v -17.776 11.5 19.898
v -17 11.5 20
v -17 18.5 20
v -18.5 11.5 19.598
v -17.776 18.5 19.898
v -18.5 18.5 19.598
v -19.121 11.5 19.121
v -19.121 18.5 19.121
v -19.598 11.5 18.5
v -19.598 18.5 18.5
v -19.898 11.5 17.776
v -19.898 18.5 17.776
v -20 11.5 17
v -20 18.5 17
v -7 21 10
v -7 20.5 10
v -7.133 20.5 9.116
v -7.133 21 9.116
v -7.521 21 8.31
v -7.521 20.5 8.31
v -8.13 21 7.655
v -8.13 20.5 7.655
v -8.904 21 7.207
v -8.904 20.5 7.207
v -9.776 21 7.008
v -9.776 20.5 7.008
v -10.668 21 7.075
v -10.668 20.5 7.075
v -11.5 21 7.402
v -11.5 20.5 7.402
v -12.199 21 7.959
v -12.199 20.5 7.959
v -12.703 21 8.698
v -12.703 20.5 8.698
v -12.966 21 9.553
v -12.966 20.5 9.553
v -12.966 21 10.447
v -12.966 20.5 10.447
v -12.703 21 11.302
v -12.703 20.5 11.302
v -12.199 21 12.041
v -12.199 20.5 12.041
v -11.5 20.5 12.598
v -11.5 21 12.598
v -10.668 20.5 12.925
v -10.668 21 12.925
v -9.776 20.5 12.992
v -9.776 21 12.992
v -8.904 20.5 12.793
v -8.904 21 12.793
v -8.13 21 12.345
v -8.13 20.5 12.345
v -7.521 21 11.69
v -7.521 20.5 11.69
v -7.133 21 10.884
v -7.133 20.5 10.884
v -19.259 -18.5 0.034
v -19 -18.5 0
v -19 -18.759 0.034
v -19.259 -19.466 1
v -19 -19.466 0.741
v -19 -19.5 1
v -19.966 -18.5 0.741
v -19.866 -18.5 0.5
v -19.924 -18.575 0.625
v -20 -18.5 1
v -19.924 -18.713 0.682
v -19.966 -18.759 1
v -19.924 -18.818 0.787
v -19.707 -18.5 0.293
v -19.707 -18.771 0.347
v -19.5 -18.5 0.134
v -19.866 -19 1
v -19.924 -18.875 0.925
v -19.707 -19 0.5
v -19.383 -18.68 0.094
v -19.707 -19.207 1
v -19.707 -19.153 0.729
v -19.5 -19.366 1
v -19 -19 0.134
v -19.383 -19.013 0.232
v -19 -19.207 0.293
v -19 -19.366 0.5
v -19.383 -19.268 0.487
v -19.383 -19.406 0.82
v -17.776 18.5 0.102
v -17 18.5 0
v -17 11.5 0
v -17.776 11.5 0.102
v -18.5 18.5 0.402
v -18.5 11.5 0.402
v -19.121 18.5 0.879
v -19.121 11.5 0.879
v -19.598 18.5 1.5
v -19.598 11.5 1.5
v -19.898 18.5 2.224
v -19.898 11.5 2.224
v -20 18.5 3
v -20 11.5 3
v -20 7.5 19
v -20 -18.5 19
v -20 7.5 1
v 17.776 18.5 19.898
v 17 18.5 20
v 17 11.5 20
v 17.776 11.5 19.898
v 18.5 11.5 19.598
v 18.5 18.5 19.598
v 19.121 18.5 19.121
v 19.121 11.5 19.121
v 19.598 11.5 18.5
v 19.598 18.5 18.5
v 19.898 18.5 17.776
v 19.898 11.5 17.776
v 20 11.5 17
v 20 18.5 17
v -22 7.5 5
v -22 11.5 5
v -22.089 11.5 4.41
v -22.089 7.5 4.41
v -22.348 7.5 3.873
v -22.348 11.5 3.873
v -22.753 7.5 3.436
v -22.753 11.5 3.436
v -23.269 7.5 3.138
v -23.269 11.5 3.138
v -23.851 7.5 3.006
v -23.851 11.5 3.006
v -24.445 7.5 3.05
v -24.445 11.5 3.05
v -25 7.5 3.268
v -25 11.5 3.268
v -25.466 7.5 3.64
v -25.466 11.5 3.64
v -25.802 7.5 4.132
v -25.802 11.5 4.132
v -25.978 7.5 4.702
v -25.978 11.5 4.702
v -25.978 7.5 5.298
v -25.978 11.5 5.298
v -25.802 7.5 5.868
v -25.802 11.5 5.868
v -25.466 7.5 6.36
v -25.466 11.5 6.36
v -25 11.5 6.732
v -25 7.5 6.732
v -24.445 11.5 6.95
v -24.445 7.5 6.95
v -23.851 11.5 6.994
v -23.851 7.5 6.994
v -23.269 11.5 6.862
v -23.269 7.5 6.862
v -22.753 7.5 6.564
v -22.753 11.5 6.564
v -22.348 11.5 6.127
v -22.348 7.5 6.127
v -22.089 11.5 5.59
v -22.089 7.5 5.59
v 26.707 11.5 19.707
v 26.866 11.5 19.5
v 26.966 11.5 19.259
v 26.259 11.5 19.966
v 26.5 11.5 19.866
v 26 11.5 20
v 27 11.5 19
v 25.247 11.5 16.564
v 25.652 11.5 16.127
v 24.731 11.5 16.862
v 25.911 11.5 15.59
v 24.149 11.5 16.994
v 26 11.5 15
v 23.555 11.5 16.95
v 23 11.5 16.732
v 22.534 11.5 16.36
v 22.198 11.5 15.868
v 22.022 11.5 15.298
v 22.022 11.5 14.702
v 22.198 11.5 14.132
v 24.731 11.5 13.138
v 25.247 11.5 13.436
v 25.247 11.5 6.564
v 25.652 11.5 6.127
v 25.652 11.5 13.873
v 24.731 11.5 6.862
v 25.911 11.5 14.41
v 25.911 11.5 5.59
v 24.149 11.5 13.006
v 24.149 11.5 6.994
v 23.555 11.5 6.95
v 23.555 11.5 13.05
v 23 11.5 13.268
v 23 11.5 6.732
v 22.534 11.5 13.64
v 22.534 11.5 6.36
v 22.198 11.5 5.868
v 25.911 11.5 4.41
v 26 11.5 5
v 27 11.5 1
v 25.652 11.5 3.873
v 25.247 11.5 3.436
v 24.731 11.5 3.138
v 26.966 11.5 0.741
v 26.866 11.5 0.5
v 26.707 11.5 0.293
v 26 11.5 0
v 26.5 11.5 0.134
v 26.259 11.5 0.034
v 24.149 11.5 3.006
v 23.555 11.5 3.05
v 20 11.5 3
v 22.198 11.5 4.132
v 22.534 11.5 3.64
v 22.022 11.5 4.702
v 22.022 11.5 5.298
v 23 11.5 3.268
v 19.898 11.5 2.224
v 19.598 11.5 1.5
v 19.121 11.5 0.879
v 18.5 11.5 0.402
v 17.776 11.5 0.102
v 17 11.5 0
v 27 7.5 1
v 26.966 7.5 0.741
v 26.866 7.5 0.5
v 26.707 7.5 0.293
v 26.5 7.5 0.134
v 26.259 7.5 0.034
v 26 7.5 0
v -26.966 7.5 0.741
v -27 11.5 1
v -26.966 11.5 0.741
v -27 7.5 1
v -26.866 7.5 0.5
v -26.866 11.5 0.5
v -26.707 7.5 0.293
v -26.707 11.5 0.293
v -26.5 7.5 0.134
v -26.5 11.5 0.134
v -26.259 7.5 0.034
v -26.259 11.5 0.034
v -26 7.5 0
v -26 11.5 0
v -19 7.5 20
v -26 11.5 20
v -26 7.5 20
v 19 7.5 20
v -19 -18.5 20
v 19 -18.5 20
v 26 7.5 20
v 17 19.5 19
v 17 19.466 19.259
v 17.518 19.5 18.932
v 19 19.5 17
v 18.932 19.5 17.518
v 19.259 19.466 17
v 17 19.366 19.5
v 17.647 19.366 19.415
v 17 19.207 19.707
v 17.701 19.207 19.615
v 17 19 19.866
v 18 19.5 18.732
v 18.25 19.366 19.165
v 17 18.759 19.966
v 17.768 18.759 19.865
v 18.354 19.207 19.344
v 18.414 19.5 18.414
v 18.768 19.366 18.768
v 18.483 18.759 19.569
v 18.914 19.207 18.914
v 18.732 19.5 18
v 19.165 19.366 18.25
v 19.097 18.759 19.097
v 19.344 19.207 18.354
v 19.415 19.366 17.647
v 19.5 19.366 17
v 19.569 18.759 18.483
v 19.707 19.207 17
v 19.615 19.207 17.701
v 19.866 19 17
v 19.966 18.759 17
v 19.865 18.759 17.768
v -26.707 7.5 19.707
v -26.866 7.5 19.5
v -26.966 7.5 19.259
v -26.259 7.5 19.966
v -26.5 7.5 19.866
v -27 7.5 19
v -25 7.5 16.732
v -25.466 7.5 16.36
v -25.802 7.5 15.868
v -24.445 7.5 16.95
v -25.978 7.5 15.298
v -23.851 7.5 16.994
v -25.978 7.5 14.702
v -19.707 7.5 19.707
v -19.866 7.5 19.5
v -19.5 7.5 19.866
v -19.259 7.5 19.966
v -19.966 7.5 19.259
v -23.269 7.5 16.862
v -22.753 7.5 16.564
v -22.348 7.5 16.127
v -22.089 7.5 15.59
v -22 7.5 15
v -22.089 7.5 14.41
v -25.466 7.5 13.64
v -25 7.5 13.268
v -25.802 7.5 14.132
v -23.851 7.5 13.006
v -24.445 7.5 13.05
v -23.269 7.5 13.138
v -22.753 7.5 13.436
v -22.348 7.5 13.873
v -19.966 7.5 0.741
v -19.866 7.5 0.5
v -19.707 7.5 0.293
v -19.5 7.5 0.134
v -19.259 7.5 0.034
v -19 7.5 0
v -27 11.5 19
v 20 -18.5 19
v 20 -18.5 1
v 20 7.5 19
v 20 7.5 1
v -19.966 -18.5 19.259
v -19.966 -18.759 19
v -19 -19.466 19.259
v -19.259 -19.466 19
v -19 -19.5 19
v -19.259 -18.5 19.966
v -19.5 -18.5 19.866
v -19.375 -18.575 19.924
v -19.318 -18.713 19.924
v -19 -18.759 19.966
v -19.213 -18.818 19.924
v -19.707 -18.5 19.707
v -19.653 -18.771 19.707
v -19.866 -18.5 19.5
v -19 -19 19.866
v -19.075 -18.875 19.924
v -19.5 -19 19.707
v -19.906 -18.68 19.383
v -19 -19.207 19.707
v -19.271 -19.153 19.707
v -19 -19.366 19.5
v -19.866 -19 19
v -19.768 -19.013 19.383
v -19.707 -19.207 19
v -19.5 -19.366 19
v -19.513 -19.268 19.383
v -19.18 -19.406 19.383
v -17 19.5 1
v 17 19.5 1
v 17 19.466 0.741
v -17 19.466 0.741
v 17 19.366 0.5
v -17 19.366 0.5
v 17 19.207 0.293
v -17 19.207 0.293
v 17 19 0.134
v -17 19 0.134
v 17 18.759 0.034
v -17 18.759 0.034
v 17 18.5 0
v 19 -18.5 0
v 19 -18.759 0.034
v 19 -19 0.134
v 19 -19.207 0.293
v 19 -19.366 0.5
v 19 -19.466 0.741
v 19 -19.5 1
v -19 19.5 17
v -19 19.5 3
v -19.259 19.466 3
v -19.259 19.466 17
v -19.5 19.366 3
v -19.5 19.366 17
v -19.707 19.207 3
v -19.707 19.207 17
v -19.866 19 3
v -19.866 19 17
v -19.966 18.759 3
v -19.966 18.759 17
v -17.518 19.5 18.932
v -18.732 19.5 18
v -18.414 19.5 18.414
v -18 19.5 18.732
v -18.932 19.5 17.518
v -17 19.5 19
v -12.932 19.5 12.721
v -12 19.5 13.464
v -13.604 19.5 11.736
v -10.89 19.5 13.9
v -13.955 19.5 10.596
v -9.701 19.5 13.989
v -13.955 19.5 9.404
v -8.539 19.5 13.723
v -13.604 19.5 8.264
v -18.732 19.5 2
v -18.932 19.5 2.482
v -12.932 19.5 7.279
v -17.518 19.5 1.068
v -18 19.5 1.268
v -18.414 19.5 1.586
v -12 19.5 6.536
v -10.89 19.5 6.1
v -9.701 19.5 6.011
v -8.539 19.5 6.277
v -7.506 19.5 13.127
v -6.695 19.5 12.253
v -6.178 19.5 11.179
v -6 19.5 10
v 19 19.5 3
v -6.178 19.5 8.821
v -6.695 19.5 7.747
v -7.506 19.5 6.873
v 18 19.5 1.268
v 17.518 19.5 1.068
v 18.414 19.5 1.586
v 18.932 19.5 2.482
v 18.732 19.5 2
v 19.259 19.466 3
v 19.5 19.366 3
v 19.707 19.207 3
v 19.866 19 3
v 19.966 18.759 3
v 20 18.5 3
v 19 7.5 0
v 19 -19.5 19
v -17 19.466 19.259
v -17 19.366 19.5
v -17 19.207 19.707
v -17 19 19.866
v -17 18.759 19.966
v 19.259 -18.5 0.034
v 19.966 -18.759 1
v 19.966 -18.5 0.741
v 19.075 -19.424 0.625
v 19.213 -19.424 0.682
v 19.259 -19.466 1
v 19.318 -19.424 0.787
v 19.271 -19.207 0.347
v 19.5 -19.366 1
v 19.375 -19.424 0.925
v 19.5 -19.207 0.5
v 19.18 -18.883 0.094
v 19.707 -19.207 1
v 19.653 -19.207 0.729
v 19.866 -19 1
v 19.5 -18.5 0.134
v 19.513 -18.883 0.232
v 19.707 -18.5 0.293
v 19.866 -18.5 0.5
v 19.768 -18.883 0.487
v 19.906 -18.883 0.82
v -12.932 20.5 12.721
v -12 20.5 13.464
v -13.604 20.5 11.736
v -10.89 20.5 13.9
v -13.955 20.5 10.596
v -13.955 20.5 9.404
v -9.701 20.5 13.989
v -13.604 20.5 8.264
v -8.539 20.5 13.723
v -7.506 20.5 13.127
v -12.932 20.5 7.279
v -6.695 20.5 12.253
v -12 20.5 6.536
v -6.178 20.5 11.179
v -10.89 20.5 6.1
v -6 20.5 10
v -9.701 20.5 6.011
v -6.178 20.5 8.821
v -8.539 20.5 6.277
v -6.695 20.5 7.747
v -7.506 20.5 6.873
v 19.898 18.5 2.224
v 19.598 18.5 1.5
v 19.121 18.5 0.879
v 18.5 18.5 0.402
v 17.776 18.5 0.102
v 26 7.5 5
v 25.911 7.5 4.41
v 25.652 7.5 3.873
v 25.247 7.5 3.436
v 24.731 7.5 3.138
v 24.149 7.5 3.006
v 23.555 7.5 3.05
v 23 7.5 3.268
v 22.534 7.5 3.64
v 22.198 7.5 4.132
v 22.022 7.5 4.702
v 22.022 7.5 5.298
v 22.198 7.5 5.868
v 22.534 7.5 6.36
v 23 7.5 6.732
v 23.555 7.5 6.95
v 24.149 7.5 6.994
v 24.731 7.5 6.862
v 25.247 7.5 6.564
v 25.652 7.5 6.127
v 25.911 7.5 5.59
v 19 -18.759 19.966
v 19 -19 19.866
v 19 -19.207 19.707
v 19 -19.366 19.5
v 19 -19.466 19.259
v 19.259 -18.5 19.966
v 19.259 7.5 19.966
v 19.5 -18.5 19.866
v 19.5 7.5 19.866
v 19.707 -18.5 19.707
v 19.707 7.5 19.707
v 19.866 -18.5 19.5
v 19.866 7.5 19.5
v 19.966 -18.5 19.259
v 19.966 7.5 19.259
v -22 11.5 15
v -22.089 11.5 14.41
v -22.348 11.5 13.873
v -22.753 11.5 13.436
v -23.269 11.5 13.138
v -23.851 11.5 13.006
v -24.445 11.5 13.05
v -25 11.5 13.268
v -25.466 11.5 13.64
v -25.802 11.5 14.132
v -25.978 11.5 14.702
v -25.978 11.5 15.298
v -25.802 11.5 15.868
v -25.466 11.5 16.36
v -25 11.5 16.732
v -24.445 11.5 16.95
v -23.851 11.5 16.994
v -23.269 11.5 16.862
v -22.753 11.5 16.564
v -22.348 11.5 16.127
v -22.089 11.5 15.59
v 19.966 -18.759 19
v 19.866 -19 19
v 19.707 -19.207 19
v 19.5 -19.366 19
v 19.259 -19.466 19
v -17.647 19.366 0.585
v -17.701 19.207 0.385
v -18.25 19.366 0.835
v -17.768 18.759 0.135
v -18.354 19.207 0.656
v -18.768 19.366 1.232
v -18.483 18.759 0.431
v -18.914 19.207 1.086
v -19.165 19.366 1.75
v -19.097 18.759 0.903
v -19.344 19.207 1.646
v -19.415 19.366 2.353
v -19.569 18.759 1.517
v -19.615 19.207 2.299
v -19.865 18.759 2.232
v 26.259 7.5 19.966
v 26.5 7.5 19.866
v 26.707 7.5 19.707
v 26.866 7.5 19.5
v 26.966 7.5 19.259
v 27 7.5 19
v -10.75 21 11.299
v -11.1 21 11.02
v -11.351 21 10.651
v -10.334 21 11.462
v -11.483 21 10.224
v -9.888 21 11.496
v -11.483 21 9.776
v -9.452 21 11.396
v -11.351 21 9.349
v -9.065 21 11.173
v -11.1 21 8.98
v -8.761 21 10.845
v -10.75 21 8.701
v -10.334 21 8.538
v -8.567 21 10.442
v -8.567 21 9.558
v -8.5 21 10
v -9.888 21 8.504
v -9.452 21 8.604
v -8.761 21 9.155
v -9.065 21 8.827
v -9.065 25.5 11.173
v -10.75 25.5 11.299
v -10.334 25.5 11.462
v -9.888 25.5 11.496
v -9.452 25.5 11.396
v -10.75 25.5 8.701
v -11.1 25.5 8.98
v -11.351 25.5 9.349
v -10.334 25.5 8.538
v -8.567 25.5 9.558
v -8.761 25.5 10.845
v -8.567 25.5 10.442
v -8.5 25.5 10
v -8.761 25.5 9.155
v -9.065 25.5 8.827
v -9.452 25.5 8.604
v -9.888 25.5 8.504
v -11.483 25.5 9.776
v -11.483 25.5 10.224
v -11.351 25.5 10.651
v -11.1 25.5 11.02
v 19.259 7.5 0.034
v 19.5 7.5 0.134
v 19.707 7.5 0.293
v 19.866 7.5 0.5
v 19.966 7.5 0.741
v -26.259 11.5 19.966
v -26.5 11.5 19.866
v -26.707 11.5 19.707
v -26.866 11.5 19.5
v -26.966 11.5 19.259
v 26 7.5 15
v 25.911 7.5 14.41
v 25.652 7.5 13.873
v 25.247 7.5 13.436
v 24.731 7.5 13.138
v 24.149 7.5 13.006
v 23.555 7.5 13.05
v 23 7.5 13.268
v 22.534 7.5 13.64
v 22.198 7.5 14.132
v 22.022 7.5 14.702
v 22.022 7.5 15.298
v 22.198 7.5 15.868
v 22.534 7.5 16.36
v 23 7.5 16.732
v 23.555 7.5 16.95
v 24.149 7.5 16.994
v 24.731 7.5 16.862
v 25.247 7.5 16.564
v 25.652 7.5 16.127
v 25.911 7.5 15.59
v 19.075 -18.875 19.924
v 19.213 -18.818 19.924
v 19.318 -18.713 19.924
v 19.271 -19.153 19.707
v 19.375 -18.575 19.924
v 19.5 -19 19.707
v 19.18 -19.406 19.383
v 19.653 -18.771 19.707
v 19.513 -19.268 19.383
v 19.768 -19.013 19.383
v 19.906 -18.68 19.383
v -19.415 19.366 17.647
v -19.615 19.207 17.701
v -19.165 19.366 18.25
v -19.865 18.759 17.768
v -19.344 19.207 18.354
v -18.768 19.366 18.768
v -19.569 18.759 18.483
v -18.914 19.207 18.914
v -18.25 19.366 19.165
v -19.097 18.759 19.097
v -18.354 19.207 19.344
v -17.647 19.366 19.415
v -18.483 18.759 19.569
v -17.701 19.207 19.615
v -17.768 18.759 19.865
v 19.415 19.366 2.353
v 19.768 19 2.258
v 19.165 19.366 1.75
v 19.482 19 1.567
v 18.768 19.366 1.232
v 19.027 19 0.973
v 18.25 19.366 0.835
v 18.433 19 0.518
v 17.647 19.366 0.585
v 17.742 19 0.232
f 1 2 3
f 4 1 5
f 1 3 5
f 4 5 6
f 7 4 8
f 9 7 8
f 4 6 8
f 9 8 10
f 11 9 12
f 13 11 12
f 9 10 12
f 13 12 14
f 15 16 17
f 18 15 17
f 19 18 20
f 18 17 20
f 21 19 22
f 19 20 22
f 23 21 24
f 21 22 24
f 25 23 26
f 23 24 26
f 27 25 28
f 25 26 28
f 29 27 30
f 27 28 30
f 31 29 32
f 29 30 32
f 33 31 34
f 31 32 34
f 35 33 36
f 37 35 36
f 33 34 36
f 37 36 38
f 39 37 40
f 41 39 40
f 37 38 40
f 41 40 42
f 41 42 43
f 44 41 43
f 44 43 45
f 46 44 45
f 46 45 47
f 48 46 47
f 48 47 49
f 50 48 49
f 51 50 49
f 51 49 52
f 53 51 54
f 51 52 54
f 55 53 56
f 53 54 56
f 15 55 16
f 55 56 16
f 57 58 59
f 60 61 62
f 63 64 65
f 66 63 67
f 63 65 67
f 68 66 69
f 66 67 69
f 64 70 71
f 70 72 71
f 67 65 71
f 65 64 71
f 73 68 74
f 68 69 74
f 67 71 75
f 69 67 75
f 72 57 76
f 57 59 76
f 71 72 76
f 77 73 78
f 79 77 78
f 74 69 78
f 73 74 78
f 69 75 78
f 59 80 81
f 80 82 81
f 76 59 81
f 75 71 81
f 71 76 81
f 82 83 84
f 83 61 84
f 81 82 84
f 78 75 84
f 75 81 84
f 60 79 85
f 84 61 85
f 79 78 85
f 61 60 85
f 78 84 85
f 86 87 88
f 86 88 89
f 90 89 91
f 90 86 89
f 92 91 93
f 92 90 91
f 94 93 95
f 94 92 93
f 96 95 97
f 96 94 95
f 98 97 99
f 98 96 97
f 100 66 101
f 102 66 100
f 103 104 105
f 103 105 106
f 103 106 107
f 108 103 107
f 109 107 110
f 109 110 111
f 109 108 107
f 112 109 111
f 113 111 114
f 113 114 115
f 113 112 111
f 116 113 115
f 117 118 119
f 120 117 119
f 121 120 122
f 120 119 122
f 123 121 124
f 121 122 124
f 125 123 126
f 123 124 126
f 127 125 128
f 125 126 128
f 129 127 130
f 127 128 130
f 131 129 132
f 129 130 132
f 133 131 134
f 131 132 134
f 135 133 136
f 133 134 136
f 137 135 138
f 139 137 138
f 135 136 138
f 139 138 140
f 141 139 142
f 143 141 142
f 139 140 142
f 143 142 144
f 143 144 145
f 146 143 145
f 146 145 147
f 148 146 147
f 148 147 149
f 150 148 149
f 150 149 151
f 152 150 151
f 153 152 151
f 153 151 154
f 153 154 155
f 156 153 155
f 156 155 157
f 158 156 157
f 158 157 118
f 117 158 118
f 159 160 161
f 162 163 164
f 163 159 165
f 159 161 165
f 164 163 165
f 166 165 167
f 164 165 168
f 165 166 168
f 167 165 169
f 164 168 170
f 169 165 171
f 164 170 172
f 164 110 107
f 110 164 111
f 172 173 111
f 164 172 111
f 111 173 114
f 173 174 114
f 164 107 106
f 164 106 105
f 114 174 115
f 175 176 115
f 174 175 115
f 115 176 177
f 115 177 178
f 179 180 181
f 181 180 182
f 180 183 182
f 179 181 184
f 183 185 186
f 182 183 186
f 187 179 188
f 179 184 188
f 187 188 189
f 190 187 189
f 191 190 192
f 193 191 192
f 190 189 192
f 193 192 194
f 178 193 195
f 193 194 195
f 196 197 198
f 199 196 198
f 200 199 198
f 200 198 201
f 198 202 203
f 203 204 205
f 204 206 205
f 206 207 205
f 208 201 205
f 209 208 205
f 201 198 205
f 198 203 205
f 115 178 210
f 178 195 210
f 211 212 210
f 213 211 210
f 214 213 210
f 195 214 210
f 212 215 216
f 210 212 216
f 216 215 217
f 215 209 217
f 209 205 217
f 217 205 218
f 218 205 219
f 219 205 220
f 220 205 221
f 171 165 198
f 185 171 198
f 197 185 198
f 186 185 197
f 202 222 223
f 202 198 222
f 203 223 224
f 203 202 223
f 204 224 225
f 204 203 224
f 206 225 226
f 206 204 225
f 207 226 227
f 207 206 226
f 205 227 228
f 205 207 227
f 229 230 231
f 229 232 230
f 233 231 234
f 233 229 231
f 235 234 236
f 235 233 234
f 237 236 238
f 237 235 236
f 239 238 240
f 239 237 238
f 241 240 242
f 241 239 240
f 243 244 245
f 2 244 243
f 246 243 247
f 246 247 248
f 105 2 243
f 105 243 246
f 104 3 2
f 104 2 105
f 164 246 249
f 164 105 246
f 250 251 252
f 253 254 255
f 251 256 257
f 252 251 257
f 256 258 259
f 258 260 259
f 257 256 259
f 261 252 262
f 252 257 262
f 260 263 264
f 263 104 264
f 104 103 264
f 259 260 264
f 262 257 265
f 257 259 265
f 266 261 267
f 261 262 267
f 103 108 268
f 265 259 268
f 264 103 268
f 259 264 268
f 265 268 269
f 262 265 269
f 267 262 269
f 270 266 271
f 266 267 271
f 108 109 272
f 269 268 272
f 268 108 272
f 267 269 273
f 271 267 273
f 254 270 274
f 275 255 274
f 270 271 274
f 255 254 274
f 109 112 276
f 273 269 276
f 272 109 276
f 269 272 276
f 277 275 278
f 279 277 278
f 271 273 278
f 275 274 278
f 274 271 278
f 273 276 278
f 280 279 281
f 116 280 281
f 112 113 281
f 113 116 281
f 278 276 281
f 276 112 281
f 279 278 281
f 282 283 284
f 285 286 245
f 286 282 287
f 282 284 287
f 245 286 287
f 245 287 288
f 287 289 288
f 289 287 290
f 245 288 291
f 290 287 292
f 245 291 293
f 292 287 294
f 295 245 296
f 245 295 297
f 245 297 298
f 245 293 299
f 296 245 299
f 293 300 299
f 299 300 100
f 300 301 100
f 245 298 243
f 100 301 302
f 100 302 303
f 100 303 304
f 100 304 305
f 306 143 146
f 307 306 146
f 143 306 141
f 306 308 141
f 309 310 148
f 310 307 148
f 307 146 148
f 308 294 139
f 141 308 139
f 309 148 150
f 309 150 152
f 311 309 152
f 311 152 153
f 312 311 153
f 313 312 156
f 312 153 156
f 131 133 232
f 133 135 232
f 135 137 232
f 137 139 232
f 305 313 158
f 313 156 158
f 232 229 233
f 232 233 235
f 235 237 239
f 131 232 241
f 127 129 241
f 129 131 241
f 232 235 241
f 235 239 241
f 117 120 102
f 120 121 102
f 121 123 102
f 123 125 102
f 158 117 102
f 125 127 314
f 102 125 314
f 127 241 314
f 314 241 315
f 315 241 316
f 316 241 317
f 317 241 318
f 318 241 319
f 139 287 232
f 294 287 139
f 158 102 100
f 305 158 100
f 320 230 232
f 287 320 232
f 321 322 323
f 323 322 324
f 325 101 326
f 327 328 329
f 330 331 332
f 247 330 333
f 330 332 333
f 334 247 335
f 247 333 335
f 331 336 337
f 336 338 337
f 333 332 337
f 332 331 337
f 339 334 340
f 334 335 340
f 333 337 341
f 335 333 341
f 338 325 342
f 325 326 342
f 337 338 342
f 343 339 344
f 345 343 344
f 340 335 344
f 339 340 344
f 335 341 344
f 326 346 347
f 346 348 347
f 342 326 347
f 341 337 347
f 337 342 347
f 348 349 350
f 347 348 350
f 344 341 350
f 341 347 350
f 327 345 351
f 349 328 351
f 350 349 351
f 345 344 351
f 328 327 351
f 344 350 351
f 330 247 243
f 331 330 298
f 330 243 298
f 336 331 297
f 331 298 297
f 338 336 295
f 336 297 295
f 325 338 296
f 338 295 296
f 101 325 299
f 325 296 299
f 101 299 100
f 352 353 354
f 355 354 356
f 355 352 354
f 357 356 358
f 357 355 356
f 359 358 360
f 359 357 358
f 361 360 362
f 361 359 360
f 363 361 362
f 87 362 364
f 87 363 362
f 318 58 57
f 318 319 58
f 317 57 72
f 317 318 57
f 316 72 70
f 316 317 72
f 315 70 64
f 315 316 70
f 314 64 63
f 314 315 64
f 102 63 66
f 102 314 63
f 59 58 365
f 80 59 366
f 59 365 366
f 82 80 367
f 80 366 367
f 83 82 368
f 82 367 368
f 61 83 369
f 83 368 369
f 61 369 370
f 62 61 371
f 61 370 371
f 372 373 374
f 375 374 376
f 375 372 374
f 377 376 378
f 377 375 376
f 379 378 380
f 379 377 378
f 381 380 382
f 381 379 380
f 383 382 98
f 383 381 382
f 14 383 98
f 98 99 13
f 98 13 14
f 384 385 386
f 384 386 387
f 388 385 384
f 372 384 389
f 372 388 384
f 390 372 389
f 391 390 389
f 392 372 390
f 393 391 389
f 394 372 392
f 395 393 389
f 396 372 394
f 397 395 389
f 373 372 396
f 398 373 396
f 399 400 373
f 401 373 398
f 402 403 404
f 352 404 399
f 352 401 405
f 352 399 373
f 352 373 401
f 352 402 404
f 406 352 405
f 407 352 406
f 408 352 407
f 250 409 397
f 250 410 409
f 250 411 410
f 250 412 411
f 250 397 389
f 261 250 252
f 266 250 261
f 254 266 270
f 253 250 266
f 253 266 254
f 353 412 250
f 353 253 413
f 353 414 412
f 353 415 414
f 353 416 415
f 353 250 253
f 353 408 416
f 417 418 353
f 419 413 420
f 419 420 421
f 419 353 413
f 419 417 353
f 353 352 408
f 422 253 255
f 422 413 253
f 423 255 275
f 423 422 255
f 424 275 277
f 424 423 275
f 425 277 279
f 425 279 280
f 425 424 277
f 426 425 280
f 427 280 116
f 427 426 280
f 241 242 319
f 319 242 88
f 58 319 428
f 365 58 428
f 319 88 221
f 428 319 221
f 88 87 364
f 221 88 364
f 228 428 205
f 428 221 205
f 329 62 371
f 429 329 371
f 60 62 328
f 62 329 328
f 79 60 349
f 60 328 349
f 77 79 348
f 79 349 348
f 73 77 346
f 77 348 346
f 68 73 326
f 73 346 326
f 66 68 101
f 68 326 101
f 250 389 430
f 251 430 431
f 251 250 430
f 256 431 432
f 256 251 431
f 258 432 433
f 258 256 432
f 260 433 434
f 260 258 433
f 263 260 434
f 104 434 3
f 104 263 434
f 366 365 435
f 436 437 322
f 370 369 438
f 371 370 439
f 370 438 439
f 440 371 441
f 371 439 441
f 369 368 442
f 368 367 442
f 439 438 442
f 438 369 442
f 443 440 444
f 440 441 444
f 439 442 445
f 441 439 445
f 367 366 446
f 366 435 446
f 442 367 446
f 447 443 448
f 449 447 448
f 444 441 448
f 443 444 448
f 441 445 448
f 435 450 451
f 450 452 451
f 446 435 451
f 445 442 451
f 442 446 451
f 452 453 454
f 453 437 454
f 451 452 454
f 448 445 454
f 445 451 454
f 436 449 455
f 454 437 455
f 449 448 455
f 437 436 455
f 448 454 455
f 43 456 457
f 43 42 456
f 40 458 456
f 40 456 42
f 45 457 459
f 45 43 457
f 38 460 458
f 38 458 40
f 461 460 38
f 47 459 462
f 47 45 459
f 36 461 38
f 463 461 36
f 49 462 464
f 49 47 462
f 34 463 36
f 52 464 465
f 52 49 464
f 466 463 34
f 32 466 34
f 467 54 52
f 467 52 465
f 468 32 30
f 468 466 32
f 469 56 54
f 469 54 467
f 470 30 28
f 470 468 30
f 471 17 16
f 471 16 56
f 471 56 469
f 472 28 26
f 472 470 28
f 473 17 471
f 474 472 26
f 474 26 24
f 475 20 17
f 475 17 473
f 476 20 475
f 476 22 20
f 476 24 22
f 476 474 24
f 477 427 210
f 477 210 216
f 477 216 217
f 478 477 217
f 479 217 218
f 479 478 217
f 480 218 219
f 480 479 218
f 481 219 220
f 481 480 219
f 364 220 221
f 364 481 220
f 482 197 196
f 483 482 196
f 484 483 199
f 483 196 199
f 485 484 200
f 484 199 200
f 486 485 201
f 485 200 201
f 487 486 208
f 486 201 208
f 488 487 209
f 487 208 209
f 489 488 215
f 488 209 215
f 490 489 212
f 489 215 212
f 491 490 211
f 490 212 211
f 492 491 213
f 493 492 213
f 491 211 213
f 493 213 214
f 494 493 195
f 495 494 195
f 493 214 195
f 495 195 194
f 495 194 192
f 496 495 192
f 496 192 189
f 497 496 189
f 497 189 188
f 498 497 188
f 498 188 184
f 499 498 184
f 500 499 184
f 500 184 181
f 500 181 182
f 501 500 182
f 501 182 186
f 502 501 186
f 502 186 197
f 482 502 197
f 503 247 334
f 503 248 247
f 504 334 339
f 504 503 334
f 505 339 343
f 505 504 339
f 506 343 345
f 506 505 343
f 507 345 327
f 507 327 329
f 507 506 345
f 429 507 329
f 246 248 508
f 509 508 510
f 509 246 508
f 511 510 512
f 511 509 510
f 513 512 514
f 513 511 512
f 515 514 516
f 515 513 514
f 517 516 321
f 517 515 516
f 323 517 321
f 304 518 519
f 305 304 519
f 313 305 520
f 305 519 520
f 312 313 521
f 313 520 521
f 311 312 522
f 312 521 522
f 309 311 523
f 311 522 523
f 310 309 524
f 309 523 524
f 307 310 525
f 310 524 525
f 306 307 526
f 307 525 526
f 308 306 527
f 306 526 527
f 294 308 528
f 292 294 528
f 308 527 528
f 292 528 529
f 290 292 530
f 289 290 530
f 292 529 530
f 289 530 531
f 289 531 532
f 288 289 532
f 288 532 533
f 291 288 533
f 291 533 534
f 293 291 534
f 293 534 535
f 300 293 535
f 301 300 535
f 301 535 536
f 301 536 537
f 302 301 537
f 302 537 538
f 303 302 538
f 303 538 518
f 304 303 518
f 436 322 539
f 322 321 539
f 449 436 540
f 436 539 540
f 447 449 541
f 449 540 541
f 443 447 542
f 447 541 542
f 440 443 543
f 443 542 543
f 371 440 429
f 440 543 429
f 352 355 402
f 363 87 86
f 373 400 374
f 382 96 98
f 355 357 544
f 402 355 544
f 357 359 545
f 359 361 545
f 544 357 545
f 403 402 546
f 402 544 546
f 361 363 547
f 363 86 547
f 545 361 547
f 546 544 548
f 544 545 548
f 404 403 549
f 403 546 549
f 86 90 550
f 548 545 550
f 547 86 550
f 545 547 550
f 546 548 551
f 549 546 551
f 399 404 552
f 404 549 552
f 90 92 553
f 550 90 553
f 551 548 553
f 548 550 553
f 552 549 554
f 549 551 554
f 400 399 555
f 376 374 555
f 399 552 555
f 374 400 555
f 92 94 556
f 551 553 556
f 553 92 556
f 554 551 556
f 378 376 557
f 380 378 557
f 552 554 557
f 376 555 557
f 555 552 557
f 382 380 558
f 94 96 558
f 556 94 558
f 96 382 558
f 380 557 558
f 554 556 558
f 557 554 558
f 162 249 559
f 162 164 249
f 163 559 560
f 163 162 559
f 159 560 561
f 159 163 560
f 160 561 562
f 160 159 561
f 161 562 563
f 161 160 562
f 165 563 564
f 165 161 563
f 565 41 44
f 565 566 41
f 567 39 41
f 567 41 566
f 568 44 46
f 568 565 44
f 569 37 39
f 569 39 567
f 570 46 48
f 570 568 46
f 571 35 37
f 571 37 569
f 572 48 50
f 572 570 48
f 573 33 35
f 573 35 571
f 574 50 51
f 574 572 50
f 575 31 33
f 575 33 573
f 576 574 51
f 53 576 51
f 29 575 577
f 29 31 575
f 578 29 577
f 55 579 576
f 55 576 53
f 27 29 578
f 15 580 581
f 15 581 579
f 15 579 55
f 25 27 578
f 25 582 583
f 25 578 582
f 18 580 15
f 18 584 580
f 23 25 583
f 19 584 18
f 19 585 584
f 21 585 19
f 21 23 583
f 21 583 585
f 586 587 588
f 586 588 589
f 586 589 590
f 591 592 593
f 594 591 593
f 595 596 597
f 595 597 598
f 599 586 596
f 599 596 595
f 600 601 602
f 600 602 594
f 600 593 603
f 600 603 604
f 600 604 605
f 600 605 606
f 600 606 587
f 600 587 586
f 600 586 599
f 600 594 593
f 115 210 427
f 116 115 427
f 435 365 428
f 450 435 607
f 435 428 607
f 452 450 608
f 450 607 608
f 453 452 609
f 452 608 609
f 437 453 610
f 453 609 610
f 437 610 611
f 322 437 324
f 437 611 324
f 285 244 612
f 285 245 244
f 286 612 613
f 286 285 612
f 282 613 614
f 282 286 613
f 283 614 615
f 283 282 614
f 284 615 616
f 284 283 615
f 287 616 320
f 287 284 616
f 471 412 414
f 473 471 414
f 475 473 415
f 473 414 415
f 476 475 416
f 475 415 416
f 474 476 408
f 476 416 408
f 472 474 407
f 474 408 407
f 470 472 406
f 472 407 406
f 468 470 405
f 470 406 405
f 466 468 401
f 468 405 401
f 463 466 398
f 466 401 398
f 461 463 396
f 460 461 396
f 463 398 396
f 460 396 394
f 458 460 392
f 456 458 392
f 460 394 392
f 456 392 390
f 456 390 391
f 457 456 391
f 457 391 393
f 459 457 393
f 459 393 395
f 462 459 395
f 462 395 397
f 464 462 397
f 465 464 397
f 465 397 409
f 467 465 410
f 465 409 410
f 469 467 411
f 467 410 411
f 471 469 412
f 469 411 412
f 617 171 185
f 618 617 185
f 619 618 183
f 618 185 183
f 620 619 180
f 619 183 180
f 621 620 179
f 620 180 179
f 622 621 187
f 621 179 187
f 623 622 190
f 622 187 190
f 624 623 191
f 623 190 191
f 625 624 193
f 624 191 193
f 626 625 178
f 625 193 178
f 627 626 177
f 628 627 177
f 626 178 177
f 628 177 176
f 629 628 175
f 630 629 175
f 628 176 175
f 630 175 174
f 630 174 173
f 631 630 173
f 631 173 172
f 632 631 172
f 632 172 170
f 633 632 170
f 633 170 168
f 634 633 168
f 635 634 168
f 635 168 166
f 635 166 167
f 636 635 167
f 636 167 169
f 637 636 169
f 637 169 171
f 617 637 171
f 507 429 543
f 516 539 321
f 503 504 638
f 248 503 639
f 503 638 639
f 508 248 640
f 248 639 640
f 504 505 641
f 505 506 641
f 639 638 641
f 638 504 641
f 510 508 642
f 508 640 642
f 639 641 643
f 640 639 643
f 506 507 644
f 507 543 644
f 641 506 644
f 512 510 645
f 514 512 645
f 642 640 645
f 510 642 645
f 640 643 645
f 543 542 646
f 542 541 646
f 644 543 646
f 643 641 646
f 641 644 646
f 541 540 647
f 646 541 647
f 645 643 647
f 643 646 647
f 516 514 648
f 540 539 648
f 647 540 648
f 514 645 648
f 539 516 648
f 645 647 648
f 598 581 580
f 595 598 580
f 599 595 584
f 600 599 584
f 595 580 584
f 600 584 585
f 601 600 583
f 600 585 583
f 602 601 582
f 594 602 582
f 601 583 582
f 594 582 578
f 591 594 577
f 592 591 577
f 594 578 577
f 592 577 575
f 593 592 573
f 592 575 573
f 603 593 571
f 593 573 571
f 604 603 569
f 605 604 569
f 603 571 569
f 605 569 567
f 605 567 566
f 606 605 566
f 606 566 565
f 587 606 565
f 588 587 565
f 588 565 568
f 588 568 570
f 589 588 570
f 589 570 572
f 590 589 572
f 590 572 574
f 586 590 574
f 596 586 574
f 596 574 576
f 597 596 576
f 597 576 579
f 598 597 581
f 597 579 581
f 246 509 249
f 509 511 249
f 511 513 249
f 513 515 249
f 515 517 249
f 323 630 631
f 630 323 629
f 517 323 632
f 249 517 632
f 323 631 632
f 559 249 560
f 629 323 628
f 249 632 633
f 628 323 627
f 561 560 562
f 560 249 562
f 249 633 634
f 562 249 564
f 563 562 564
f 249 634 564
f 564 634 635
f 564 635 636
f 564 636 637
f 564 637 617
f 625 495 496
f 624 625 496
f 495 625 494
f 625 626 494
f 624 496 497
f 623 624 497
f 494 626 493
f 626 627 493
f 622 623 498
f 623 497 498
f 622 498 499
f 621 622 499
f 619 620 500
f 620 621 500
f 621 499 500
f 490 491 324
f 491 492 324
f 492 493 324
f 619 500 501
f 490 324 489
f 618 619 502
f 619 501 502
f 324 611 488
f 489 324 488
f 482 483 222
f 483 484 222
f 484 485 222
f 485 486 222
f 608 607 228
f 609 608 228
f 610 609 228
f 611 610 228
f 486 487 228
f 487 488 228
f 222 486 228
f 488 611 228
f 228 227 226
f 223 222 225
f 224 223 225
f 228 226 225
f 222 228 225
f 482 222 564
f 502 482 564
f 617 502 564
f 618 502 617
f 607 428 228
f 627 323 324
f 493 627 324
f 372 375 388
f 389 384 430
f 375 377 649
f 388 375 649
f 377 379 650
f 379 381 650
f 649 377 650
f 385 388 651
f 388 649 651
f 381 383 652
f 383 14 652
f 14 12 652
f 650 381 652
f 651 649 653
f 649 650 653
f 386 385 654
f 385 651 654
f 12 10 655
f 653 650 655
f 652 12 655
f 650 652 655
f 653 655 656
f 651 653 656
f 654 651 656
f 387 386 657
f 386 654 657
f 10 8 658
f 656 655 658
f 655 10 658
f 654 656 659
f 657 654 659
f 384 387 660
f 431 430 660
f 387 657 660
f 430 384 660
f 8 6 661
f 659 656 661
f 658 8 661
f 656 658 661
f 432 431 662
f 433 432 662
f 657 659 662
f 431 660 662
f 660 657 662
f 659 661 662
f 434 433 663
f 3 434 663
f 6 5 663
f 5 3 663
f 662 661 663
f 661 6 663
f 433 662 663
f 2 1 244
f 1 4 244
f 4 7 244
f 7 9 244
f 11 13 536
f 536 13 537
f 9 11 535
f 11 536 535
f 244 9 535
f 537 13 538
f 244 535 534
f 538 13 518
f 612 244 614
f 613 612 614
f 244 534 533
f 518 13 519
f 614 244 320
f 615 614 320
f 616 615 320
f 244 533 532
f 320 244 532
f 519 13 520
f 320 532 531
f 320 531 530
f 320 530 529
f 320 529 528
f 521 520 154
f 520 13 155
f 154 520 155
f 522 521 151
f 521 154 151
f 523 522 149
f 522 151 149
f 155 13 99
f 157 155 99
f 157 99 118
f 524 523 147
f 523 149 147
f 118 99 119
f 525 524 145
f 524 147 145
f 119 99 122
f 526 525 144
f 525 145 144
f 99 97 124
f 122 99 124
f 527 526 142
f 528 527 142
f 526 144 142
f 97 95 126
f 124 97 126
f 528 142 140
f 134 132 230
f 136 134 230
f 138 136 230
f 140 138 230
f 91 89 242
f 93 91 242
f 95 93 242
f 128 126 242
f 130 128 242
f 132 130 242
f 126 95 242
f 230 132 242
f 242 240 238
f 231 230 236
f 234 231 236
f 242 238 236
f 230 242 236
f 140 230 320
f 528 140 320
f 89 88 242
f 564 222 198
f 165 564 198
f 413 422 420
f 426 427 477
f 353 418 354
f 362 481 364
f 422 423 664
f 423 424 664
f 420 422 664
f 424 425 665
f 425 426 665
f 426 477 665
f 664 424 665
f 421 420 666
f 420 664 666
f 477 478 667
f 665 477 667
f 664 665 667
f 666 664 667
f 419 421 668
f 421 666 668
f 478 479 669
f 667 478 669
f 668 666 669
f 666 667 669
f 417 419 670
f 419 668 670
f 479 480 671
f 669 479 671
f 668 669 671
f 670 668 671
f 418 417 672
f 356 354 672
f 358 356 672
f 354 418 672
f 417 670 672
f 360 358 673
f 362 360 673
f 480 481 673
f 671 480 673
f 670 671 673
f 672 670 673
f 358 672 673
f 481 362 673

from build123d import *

# Parameters (mm, degrees)
SKETCH_1_W          = 40
SKETCH_1_H          = 39
SKETCH_1_R          = 2
EXTRUDE_2_DEPTH     = 20
SKETCH_4_R          = 2
CUT_EXTRUDE_1_DEPTH = 20
SKETCH_5_R          = 4
EXTRUDE_3_DEPTH     = 1
SKETCH_6_R          = 3
EXTRUDE_4_DEPTH     = 0.5
SKETCH_7_R          = 1.5
EXTRUDE_5_DEPTH     = 4.5
FILLET_2_R          = 3
FILLET_3_R          = 3
FILLET_4_R          = 1
FILLET_5_R          = 1
FILLET_6_R          = 1
FILLET_8_R          = 1


with BuildPart() as part:
    # 草图1 → 凸台-拉伸2 (new body)
    with BuildSketch(Plane.XY):
        Rectangle(SKETCH_1_W, SKETCH_1_H)
        with BuildLine():
            Line((-20, 7.5), (-20, 11.5))
            Line((-20, 11.5), (-24, 11.5))
            ThreePointArc((-24, 11.5), (-22.585786438, 10.914213562), (-22, 9.5))
            ThreePointArc((-22, 9.5), (-22.585786438, 8.085786438), (-24, 7.5))
            Line((-24, 7.5), (-20, 7.5))
        make_face()
        with BuildLine():
            ThreePointArc((-24, 7.5), (-26, 9.5), (-24, 11.5))
            Line((-24, 11.5), (-27, 11.5))
            Line((-27, 11.5), (-27, 7.5))
            Line((-27, 7.5), (-24, 7.5))
        make_face()
        with Locations((-24, 9.5)):
            Circle(SKETCH_1_R)
        Polygon((27, 11.5), (20, 11.5), (20, 7.5), (24, 7.5), (27, 7.5), align=None)
    extrude(amount=EXTRUDE_2_DEPTH)

    # 草图4 → 切除-拉伸1 (cut)
    with BuildSketch(Plane(origin=(0, 19.5, 0), x_dir=(1, 0, 0), z_dir=(0, 1, 0))):
        with Locations((-24, -15)):
            Circle(SKETCH_4_R)
        with Locations((24, -15)):
            Circle(SKETCH_4_R)
        with Locations((-24, -5)):
            Circle(SKETCH_4_R)
        with Locations((24, -5)):
            Circle(SKETCH_4_R)
    extrude(amount=-CUT_EXTRUDE_1_DEPTH, mode=Mode.SUBTRACT)

    # 草图5 → 凸台-拉伸3 (add)
    with BuildSketch(Plane(origin=(0, 19.5, 0), x_dir=(1, 0, 0), z_dir=(0, 1, 0))):
        with Locations((-10, -10)):
            Circle(SKETCH_5_R)
    extrude(amount=EXTRUDE_3_DEPTH)

    # 草图6 → 凸台-拉伸4 (add)
    with BuildSketch(Plane(origin=(0, 20.5, 0), x_dir=(1, 0, 0), z_dir=(0, 1, 0))):
        with Locations((-10, -10)):
            Circle(SKETCH_6_R)
    extrude(amount=EXTRUDE_4_DEPTH)

    # 草图7 → 凸台-拉伸5 (add)
    with BuildSketch(Plane(origin=(0, 21, 0), x_dir=(1, 0, 0), z_dir=(0, 1, 0))):
        with Locations((-10, -10)):
            Circle(SKETCH_7_R)
    extrude(amount=EXTRUDE_5_DEPTH)

    # 圆角2
    fillet_2_edges = [part.edges().sort_by_distance(p)[0] for p in [
        (-20, 15.5, 20),
    ]]
    fillet(fillet_2_edges, radius=FILLET_2_R)

    # 圆角3
    fillet_3_edges = [part.edges().sort_by_distance(p)[0] for p in [
        (-20, 15.5, 0),
        (20, 15.5, 0),
        (20, 15.5, 20),
    ]]
    fillet(fillet_3_edges, radius=FILLET_3_R)

    # 圆角4
    fillet_4_edges = [part.edges().sort_by_distance(p)[0] for p in [
        (20, -6, 0),
        (0, -19.5, 0),
        (-20, -6, 0),
        (20, -19.5, 10),
        (-20, -19.5, 10),
        (-20, -6, 20),
        (0, -19.5, 20),
        (20, -6, 20),
    ]]
    fillet(fillet_4_edges, radius=FILLET_4_R)

    # 圆角5
    fillet_5_edges = [part.edges().sort_by_distance(p)[0] for p in [
        (-27, 9.5, 0),
        (-27, 9.5, 20),
    ]]
    fillet(fillet_5_edges, radius=FILLET_5_R)

    # 圆角6
    fillet_6_edges = [part.edges().sort_by_distance(p)[0] for p in [
        (19.121320344, 19.5, 0.878679656),
        (19.121320344, 19.5, 19.121320344),
        (0, 19.5, 20),
        (-20, 19.5, 10),
        (-19.121320344, 19.5, 19.121320344),
        (20, 19.5, 10),
        (0, 19.5, 0),
        (-19.121320344, 19.5, 0.878679656),
    ]]
    fillet(fillet_6_edges, radius=FILLET_6_R)

    # 圆角8
    fillet_8_edges = [part.edges().sort_by_distance(p)[0] for p in [
        (27, 9.5, 0),
        (27, 9.5, 20),
    ]]
    fillet(fillet_8_edges, radius=FILLET_8_R)


solid = part.part
